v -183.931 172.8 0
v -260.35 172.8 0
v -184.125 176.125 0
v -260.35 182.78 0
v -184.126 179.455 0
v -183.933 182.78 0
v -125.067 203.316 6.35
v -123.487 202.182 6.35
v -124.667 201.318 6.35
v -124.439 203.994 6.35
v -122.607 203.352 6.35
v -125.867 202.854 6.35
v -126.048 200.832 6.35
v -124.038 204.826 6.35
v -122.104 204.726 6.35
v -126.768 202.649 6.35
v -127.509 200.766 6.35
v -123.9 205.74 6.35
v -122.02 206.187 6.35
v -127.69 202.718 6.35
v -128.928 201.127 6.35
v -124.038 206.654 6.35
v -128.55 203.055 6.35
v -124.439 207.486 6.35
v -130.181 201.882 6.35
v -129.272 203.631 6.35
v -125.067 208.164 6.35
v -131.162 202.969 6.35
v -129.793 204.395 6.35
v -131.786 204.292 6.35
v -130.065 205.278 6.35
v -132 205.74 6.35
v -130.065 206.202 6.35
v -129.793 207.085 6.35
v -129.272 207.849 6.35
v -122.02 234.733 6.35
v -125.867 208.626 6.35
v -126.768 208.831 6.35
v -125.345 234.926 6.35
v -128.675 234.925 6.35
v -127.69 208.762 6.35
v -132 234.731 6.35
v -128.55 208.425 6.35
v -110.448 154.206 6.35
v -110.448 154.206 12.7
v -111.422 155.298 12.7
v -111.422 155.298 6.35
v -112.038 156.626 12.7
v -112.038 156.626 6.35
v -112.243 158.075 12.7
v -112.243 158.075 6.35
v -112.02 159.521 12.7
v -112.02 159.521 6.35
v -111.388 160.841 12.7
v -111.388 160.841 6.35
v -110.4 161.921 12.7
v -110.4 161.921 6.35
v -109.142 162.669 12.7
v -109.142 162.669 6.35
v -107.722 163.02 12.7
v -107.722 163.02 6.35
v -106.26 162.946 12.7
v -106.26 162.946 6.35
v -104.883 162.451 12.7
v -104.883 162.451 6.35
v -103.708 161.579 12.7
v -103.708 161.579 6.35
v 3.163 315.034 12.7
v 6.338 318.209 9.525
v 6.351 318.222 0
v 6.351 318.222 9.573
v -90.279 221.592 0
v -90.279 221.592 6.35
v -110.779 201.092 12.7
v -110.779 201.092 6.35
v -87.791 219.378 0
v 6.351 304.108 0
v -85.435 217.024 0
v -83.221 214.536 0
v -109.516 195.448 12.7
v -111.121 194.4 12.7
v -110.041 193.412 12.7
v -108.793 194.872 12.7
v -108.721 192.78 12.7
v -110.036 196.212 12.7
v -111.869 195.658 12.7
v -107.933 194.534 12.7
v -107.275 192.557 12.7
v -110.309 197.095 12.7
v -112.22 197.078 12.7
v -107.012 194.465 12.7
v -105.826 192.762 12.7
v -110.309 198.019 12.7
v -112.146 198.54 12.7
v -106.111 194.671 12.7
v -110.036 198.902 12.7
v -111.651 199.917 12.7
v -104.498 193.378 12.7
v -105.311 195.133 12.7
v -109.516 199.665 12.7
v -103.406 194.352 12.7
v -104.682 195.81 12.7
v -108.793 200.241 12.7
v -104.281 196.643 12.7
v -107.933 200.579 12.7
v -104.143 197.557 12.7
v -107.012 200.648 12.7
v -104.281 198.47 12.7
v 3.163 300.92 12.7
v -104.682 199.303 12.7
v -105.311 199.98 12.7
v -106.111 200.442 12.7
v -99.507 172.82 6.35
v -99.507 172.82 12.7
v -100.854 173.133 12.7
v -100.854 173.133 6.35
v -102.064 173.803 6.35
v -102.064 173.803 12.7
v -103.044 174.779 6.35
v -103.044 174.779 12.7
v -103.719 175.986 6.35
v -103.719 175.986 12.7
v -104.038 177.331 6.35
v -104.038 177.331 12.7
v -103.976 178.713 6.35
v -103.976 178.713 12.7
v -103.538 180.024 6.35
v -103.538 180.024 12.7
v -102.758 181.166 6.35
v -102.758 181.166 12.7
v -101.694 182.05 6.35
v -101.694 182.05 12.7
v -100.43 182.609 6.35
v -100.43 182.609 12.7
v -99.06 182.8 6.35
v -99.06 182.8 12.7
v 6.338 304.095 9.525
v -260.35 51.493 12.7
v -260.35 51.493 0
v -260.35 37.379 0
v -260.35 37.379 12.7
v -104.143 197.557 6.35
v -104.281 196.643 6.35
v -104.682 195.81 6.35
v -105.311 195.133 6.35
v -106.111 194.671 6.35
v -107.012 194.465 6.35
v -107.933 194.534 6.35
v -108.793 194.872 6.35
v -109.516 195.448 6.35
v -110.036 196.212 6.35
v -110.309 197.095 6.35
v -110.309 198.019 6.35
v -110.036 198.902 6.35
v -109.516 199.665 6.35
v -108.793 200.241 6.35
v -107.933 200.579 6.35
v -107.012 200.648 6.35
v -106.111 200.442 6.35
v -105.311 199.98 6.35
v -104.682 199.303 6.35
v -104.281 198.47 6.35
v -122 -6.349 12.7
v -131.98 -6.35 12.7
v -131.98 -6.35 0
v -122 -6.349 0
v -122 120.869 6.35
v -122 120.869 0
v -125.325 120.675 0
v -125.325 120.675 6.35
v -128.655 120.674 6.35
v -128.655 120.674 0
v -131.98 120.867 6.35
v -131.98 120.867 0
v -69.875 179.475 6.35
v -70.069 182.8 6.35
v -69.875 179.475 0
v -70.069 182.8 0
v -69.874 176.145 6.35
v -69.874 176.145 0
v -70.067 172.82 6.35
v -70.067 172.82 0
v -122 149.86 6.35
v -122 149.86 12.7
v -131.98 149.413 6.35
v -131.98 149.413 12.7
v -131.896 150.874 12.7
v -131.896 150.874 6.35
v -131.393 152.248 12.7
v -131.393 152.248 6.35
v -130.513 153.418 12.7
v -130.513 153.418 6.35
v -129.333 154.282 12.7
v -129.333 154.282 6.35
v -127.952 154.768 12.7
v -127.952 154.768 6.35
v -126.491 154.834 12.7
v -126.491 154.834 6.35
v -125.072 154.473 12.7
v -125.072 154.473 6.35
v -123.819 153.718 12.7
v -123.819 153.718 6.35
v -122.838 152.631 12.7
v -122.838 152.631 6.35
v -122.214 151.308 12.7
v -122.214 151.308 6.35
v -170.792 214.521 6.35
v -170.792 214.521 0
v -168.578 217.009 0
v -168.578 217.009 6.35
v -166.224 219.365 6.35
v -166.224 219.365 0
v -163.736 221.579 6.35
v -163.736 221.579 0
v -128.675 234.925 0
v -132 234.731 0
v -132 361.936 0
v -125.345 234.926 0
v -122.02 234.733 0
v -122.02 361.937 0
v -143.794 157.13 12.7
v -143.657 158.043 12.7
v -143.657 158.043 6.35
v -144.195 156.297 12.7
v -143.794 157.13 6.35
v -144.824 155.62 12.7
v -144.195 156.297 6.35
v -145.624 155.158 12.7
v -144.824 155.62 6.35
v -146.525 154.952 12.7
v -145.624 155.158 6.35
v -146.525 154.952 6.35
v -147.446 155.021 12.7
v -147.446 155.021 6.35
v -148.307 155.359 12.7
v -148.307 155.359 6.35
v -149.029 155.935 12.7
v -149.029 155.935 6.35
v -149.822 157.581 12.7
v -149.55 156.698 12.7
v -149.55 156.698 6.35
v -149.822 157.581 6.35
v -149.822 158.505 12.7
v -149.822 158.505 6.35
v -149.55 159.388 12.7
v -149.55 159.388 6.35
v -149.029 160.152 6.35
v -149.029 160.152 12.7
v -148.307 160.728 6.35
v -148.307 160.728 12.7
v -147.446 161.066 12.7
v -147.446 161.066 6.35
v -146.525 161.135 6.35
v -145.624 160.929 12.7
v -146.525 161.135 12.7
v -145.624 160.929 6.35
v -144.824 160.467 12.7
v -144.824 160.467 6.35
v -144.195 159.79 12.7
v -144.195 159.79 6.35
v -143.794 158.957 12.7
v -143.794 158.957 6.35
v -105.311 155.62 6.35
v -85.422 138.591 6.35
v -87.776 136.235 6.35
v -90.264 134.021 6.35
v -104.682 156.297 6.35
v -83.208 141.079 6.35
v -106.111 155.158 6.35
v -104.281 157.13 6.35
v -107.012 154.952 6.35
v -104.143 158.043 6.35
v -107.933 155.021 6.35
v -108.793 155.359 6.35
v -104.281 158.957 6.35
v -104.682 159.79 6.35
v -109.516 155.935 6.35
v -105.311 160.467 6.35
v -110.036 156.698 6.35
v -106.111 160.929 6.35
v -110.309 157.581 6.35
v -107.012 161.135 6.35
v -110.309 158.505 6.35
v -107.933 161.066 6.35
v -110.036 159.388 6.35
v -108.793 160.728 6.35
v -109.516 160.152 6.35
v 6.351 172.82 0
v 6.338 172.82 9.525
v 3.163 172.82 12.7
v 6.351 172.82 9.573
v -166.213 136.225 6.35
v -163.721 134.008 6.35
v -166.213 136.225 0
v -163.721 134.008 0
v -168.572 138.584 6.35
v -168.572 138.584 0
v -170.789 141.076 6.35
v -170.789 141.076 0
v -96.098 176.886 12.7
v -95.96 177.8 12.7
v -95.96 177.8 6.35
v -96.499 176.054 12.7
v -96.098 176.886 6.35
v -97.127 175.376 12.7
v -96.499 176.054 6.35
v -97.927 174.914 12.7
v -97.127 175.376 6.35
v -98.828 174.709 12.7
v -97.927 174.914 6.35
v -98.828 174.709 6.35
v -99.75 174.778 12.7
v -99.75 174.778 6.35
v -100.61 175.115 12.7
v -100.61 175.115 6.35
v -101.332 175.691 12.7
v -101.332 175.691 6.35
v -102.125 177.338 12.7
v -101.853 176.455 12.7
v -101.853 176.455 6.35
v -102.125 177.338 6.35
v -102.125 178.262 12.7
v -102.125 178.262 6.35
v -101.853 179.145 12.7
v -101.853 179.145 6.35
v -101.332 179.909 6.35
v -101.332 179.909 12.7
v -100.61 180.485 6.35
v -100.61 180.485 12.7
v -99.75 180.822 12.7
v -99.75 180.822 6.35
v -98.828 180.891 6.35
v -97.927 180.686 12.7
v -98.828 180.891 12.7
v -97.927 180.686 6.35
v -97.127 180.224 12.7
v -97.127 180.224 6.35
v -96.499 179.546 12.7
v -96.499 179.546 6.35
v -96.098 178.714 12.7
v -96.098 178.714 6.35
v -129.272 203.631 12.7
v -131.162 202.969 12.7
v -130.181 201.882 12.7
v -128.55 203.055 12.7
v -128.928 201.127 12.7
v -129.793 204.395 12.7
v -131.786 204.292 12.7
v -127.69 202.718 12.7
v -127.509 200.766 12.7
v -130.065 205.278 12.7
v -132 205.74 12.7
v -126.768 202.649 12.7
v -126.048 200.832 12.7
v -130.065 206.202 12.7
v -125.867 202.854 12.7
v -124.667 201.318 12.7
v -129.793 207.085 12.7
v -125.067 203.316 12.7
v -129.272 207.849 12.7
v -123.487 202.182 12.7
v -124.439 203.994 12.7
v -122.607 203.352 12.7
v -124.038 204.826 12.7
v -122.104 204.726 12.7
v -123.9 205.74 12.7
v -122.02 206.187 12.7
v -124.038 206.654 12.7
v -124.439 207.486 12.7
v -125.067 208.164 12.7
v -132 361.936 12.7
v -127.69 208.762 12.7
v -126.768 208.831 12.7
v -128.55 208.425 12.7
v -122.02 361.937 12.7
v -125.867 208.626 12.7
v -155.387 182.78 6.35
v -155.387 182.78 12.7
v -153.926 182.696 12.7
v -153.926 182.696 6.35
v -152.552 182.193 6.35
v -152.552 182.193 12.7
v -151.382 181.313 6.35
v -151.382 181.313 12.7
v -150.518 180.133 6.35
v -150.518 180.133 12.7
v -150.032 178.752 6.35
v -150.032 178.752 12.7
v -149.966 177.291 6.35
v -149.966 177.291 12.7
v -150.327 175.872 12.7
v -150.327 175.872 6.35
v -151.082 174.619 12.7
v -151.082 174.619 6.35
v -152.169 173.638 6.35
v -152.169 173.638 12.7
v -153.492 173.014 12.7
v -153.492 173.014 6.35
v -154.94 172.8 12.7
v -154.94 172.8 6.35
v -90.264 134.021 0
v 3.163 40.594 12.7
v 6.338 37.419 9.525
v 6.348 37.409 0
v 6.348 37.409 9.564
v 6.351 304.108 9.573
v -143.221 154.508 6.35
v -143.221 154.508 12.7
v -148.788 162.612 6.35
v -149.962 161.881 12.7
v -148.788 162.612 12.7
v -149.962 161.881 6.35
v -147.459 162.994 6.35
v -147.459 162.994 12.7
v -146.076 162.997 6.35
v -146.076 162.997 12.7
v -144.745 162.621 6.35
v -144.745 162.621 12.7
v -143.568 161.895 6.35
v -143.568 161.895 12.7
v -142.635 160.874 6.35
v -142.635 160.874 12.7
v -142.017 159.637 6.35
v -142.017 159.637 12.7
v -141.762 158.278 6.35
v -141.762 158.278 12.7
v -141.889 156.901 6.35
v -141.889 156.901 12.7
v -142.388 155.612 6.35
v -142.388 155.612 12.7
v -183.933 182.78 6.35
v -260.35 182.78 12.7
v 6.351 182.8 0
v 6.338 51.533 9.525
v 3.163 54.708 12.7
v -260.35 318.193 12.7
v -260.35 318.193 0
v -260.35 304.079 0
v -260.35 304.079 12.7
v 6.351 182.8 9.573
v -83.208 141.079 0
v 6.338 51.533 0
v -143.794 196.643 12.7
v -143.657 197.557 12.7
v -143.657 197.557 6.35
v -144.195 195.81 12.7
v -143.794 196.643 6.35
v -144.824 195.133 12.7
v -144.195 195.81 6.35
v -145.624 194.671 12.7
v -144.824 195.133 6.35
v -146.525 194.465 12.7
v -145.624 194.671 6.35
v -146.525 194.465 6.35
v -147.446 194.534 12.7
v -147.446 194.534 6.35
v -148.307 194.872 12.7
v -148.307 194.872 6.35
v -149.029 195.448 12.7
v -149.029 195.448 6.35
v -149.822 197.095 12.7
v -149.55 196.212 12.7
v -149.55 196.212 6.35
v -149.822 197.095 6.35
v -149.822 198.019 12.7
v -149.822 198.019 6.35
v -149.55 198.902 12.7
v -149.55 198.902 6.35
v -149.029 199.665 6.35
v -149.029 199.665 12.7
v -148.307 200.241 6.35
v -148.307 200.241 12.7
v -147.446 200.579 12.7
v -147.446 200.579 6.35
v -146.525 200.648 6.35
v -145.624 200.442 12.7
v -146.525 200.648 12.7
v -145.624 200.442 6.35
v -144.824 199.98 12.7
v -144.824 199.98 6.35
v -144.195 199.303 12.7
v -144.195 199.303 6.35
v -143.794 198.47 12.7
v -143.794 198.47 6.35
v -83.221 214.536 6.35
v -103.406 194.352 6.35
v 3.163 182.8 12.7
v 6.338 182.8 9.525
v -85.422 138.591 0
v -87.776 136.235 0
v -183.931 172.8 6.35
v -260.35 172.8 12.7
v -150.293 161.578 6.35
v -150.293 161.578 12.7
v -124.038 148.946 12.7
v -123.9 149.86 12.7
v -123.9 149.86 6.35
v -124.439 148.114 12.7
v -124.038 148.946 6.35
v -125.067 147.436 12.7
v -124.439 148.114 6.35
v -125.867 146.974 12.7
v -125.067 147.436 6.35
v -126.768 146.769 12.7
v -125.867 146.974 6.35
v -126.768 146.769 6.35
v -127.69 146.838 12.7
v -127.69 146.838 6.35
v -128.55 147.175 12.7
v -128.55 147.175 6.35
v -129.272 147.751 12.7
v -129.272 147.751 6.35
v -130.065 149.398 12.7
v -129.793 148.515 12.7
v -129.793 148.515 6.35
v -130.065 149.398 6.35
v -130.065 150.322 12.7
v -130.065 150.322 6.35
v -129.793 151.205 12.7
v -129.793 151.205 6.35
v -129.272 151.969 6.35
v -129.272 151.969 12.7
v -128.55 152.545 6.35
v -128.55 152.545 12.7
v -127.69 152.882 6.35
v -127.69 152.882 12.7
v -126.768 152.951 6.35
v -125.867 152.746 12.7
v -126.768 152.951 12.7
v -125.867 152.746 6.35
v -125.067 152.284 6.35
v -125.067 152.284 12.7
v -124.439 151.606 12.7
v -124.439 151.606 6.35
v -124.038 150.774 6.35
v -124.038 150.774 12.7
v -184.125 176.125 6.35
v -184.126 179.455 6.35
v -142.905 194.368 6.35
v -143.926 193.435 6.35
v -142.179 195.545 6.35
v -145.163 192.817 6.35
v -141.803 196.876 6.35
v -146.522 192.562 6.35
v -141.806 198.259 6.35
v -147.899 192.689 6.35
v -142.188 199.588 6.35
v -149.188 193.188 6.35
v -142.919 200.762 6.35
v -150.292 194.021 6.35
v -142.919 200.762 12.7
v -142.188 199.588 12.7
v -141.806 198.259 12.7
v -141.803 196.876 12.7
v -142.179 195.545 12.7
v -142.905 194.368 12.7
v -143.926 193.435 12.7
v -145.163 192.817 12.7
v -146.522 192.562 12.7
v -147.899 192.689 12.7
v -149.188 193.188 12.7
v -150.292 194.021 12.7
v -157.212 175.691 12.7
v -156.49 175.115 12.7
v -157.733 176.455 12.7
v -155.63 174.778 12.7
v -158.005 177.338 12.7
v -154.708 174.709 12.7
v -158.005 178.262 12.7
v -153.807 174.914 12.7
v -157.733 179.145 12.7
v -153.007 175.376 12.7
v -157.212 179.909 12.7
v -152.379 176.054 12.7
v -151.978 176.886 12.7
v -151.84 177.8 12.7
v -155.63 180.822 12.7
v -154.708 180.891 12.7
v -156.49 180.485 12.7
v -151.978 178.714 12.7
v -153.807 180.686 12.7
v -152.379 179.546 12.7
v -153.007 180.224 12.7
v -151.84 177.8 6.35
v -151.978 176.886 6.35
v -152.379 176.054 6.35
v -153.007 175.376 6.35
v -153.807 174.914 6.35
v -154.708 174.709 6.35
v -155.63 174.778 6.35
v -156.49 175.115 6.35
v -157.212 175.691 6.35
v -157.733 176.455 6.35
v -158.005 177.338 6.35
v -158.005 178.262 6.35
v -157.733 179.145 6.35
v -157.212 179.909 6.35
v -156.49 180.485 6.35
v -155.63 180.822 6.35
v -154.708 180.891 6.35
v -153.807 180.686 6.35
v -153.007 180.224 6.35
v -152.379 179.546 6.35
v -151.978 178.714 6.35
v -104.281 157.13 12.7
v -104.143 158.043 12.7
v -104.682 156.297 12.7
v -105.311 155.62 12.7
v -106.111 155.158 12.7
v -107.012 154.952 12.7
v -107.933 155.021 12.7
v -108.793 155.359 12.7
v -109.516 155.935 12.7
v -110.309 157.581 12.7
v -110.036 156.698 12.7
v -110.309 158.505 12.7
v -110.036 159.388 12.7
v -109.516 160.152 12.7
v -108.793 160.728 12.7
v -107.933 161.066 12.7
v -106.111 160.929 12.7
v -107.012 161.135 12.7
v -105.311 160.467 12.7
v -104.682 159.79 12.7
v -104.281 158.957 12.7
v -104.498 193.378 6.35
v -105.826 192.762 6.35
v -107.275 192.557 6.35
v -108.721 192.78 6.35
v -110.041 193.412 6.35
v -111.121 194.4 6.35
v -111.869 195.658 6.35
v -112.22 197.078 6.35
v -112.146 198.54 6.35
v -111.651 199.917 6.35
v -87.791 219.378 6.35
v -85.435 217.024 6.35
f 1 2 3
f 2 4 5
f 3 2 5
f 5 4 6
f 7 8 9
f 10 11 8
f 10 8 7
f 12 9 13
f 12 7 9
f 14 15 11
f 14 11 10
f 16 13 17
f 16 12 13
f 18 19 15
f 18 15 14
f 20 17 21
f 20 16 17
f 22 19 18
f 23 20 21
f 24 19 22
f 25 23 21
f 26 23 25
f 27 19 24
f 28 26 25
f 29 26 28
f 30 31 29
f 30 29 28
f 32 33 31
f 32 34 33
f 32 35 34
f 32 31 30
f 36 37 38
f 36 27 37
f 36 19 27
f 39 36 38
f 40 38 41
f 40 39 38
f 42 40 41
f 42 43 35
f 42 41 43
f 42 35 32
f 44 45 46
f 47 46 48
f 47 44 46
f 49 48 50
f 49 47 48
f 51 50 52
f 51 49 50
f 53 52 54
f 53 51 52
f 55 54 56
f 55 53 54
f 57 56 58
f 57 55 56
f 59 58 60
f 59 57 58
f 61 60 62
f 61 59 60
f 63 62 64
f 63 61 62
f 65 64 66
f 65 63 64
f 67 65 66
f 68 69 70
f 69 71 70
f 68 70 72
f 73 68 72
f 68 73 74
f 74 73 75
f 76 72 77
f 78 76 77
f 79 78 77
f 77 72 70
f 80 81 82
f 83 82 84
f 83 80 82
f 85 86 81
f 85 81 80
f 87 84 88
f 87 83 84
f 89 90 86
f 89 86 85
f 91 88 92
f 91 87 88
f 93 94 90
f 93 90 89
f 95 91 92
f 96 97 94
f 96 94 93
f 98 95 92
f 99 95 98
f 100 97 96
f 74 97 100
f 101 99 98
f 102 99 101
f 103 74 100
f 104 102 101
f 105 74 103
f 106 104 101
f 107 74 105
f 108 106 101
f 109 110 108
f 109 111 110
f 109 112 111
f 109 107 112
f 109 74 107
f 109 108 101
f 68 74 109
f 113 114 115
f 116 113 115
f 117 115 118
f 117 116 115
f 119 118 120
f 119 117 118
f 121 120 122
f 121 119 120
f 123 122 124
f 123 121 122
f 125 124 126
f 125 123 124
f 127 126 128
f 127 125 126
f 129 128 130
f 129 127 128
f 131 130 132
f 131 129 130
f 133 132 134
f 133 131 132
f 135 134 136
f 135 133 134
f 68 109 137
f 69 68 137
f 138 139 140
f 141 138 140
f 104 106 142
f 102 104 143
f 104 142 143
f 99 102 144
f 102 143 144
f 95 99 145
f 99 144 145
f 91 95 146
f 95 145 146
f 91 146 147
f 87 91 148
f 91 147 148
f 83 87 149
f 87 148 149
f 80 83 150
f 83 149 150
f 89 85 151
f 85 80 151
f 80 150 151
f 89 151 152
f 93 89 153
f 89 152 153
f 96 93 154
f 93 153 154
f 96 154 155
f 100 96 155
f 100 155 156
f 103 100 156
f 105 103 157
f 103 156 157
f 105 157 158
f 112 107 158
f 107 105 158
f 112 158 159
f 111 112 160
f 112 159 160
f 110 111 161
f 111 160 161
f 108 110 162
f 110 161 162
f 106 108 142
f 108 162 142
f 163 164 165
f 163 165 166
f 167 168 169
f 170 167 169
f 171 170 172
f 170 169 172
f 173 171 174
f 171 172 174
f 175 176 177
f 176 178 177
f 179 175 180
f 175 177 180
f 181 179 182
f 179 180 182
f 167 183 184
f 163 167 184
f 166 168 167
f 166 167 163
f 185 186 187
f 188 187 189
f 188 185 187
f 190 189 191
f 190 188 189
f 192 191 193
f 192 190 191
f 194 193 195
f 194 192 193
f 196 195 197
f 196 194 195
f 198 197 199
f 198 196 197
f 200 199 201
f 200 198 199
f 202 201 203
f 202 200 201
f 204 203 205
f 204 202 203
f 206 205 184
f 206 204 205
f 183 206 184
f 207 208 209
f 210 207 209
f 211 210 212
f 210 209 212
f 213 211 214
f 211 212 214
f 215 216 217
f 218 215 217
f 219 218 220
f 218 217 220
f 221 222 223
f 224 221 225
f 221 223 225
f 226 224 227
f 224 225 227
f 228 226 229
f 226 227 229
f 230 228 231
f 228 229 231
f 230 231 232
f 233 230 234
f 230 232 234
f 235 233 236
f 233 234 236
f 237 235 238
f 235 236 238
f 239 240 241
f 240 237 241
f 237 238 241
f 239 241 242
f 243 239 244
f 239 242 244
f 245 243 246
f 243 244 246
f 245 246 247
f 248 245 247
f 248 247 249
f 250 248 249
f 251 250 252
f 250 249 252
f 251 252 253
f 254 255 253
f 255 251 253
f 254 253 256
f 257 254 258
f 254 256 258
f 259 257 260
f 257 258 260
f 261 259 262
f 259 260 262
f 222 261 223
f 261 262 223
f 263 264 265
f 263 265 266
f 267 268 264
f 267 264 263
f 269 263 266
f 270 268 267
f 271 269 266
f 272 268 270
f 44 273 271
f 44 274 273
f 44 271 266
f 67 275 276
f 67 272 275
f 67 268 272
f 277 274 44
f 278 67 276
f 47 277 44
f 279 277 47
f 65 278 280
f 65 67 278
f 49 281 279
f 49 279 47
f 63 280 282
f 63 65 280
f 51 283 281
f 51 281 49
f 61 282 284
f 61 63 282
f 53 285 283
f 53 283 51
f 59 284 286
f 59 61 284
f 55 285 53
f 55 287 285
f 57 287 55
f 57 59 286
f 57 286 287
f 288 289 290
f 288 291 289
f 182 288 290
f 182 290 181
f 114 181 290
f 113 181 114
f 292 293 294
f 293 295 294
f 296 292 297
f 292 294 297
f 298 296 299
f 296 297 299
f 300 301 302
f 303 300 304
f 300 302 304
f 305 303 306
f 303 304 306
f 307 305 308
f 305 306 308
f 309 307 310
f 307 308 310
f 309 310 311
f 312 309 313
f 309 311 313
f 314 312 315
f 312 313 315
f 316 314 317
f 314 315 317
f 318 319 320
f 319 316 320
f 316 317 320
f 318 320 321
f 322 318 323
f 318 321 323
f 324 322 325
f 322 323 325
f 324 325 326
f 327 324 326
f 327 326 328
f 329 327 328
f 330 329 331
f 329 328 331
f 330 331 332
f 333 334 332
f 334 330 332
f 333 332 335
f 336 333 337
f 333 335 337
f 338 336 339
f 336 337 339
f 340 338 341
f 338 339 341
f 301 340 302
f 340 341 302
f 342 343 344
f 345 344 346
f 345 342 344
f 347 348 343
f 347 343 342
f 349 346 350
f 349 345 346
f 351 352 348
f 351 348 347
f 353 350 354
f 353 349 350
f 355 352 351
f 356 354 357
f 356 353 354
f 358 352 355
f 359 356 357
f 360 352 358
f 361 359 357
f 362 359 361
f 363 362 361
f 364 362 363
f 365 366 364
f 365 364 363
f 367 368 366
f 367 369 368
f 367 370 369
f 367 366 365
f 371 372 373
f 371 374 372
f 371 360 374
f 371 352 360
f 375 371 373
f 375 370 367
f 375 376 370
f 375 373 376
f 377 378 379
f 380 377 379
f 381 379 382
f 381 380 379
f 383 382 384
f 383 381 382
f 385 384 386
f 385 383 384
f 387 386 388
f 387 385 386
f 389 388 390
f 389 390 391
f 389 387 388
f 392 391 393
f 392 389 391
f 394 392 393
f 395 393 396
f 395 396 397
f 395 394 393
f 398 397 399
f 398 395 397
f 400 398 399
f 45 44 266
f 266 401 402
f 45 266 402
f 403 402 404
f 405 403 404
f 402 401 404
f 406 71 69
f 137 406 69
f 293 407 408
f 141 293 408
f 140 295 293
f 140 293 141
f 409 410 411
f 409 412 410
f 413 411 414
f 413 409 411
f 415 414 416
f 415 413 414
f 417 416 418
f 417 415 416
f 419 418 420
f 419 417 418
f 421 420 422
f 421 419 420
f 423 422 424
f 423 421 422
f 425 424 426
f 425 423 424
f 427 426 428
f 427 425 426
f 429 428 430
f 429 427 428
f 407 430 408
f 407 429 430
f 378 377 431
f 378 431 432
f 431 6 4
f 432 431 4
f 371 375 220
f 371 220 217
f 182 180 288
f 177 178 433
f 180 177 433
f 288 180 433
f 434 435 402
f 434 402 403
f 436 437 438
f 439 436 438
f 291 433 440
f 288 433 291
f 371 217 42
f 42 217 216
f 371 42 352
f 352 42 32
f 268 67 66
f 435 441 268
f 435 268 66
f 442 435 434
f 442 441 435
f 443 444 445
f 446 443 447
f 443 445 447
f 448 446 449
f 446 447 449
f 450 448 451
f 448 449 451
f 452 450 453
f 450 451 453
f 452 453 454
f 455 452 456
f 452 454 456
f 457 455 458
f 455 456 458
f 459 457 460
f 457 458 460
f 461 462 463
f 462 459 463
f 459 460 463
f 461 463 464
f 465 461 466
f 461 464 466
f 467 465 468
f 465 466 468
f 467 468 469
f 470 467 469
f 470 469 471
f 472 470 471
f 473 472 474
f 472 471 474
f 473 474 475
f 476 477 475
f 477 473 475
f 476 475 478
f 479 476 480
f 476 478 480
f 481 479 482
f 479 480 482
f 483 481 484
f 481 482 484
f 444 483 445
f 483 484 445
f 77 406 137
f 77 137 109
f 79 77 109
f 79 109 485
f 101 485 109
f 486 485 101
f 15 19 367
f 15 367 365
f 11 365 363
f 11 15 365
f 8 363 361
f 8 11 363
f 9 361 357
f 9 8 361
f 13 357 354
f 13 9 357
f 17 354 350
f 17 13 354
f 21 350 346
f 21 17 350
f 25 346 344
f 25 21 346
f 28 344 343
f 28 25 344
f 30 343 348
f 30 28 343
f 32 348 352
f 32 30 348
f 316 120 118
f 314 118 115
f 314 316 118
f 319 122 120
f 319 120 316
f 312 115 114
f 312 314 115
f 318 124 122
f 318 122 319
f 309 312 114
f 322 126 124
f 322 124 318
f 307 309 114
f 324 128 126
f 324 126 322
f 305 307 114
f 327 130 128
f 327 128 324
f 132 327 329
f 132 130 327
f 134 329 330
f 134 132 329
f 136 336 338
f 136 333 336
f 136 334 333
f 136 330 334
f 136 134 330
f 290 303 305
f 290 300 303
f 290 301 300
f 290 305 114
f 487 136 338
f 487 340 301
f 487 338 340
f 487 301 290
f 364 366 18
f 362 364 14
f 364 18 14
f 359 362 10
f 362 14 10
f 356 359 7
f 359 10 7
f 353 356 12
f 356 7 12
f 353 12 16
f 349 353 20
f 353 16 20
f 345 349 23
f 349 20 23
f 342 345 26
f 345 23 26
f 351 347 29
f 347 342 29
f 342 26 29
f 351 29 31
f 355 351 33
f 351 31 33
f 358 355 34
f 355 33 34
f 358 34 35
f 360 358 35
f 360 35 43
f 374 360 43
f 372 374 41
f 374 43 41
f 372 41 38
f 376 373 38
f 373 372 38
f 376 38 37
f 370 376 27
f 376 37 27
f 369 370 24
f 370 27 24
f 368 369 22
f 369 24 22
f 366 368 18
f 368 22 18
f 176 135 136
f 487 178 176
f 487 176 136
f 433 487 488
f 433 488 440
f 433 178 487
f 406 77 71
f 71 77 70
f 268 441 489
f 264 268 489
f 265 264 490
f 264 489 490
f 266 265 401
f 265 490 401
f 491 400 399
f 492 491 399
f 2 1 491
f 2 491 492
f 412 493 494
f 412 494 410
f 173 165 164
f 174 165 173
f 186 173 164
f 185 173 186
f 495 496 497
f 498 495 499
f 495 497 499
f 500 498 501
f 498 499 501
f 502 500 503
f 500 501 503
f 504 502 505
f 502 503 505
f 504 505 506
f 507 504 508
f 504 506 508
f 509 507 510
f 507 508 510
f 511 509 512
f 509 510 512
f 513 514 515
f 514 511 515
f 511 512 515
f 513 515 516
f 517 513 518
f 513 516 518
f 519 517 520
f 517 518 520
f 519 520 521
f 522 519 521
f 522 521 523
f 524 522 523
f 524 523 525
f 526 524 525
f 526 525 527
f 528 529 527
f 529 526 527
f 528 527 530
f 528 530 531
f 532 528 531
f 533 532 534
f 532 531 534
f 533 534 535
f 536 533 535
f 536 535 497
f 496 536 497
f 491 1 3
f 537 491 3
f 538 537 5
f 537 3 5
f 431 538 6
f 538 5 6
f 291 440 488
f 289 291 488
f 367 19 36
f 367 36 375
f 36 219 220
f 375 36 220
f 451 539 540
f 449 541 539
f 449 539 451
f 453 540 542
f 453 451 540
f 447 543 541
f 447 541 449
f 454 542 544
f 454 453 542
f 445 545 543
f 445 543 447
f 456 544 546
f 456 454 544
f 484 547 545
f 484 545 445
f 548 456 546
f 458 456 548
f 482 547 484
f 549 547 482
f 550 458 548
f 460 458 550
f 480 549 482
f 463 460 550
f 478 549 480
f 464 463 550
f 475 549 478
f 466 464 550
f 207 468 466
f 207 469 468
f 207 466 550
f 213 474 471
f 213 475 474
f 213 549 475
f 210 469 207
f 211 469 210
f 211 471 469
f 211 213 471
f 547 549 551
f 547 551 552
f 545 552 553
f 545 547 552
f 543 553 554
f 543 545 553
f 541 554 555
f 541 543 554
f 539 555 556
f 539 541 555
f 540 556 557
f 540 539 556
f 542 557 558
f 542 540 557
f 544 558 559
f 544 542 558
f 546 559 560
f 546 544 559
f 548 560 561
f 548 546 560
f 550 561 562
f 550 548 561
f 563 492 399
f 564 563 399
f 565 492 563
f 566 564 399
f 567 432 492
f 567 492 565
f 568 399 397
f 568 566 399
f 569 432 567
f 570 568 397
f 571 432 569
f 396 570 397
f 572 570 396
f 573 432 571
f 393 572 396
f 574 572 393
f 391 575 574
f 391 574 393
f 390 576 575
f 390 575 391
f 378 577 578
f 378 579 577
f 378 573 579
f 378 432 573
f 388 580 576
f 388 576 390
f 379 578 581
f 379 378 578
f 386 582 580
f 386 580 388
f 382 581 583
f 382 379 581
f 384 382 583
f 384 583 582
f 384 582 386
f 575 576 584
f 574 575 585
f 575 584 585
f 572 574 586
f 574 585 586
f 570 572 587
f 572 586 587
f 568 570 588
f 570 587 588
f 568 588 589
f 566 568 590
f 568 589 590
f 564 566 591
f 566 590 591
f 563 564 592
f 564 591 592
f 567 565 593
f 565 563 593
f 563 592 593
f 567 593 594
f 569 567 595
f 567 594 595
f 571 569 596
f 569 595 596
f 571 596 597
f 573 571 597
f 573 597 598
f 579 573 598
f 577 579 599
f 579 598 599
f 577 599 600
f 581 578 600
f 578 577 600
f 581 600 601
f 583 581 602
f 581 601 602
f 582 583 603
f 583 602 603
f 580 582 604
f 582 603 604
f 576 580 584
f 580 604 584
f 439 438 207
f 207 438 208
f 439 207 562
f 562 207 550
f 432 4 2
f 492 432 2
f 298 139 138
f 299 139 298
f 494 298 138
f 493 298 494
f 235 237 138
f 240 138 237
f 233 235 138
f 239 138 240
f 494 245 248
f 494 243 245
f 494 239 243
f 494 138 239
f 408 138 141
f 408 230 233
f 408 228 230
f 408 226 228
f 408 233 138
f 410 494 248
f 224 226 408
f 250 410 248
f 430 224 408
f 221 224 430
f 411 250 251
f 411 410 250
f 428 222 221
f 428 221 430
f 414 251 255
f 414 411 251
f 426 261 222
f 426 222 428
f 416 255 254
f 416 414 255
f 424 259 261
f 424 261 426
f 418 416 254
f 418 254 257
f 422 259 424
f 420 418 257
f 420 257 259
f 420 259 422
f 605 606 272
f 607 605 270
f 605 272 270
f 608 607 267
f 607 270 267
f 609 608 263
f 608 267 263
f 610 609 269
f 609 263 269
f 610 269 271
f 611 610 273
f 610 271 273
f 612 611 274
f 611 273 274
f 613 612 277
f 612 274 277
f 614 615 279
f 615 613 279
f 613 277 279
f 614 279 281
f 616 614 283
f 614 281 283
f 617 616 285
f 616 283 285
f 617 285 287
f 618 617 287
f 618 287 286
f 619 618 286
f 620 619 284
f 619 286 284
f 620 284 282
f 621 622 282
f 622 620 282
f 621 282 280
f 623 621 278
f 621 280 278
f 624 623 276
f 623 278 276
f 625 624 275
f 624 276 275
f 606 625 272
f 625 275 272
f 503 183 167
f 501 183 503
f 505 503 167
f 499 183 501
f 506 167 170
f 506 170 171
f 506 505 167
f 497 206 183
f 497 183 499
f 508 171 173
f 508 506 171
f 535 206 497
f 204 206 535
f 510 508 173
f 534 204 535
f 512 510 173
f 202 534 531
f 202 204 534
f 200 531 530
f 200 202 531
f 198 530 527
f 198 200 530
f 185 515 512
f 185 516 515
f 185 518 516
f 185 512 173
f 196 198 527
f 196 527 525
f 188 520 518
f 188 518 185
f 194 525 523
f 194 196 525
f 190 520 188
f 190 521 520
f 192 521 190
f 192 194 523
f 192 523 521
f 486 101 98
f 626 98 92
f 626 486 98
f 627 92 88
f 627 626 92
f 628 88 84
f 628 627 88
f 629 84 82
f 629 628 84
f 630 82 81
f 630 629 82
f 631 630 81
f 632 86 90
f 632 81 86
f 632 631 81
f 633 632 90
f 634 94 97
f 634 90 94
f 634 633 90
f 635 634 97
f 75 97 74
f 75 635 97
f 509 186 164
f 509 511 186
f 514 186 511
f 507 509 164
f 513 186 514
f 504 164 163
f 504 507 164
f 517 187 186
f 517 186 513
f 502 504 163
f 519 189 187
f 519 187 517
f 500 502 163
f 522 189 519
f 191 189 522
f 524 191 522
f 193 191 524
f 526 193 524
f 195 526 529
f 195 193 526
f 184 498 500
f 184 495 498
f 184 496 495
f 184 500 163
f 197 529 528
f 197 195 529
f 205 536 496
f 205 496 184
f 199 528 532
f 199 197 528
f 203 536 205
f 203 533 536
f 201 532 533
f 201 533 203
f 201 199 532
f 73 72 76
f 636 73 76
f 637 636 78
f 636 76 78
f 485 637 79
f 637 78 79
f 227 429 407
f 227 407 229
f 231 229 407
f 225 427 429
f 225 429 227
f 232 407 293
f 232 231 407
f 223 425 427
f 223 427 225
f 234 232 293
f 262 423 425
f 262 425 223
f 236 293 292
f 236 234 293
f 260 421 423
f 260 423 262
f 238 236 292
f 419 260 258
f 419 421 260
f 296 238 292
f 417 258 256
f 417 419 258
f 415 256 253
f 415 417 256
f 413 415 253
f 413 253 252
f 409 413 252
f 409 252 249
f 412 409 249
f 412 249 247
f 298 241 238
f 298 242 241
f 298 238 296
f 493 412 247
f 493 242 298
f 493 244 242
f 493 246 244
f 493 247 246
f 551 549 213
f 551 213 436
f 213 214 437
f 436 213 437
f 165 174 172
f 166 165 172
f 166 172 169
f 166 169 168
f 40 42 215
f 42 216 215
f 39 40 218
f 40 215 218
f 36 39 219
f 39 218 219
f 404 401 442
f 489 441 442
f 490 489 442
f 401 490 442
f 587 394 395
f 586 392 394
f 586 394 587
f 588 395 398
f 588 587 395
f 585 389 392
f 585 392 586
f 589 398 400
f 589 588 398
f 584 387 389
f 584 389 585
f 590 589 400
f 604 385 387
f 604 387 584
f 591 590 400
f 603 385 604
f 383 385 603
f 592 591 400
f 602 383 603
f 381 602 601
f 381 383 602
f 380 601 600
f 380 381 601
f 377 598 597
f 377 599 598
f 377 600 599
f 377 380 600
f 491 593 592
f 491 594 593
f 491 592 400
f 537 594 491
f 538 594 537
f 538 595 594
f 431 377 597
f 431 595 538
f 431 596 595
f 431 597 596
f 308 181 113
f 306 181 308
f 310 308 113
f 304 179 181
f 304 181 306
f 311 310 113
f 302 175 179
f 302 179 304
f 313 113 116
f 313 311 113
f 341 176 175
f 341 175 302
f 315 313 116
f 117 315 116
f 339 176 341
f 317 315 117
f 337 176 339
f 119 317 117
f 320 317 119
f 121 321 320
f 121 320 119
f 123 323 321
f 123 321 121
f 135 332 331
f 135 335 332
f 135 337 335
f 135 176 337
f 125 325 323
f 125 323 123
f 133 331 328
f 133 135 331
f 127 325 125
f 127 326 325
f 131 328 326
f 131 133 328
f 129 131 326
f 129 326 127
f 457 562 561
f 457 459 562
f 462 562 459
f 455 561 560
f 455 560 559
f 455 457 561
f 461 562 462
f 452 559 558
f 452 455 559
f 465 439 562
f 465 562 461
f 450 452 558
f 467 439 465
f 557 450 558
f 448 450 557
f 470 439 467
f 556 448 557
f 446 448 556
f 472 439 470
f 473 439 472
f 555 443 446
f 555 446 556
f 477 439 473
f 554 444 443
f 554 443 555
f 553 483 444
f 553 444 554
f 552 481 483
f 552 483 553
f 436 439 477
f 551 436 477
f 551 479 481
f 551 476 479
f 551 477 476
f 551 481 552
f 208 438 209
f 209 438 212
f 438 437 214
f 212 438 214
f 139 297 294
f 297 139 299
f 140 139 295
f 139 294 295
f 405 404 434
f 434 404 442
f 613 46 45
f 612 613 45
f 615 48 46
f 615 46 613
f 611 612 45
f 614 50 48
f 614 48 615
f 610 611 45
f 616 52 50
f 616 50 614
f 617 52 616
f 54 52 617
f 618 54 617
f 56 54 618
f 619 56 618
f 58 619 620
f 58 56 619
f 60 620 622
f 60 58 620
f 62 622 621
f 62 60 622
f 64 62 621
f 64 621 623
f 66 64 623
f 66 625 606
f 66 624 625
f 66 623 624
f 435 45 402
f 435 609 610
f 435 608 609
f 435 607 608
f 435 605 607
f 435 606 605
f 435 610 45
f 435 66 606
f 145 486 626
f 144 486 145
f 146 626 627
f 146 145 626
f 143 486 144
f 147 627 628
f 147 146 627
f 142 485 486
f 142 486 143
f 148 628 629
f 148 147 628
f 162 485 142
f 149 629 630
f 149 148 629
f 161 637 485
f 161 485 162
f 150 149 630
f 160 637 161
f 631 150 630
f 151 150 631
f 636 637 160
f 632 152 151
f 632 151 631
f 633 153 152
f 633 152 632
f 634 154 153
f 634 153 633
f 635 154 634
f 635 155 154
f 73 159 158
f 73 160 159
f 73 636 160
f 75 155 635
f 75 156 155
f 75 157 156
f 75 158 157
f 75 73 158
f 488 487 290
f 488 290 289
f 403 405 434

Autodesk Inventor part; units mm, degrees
ref_plane "YZ Plane" through (0, 0, 0) normal (1, 0, 0) x (0, 1, 0)
ref_plane "XZ Plane" through (0, 0, 0) normal (0, 1, 0) x (-1, 0, 0)
ref_plane "XY Plane" through (0, 0, 0) normal (0, 0, 1) x (1, 0, 0)
sketch "Sketch1" plane through (0, 0, 0) normal (0, 0, 1) x (1, 0, 0)
  line L0 (0, 0) -> (0, 355.6) construction
  line L1 (-254, 0) -> (0, 0) construction
  line L2 (0, 355.6) -> (-254, 0) construction
  circle A0 centre (-127, 177.8) radius 38.1 construction
  circle A1 centre (-127, 177.8) radius 27.94 construction
  line L3 (0, 355.6) -> (0, 325.12) construction
  line L4 (-127, 177.8) -> (-100.0592, 204.7408) construction
  line L5 (-127, 177.8) -> (-95.96, 177.8) construction
  circle A2 centre (-107.2434, 197.5566) radius 3.1 construction
  circle A3 centre (-127, 205.74) radius 3.1 construction
  circle A4 centre (-127, 177.8) radius 27.94 construction
  circle A5 centre (-146.7566, 197.5566) radius 3.1 construction
  circle A6 centre (-127, 177.8) radius 27.94 construction
  circle A7 centre (-154.94, 177.8) radius 3.1 construction
  circle A8 centre (-127, 177.8) radius 27.94 construction
  circle A9 centre (-146.7566, 158.0434) radius 3.1 construction
  circle A10 centre (-127, 177.8) radius 27.94 construction
  circle A11 centre (-127, 149.86) radius 3.1 construction
  circle A12 centre (-127, 177.8) radius 27.94 construction
  circle A13 centre (-107.2434, 158.0434) radius 3.1 construction
  circle A14 centre (-127, 177.8) radius 27.94 construction
  circle A15 centre (-99.06, 177.8) radius 3.1 construction
  circle A16 centre (-127, 177.8) radius 27.94 construction
  arc A17 (-99.06, 182.8) -> (-98.6126, 172.8201) centre (-99.06, 177.8) ccw construction
  line L6 (-99.06, 182.8) -> (104.14, 182.8) construction
  line L7 (104.14, 182.8) -> (104.773, 172.8201) construction
  line L8 (104.773, 172.8201) -> (-99.5074, 172.8201) construction
  line L9 (-110.779, 201.0921) -> (32.9051, 344.7762) construction
  line L10 (32.9051, 344.7762) -> (40.4096, 338.1669) construction
  line L11 (40.4096, 338.1669) -> (-104.0384, 193.7189) construction
  arc A18 (-110.779, 201.0921) -> (-103.4057, 194.3516) centre (-107.2434, 197.5566) ccw construction
  line L12 (-132, 205.74) -> (-132, 408.94) construction
  line L13 (-132, 408.94) -> (-122.0201, 409.573) construction
  line L14 (-122.0201, 409.573) -> (-122.0201, 205.2926) construction
  arc A19 (-132, 205.74) -> (-122.0201, 206.1874) centre (-127, 205.74) ccw construction
  line L15 (-150.2921, 194.021) -> (-293.9762, 337.7051) construction
  line L16 (-293.9762, 337.7051) -> (-287.3669, 345.2096) construction
  line L17 (-287.3669, 345.2096) -> (-142.9189, 200.7616) construction
  arc A20 (-150.2921, 194.021) -> (-143.5516, 201.3943) centre (-146.7566, 197.5566) ccw construction
  line L18 (-154.94, 172.8) -> (-358.14, 172.8) construction
  line L19 (-358.14, 172.8) -> (-358.773, 182.7799) construction
  line L20 (-358.773, 182.7799) -> (-154.4926, 182.7799) construction
  arc A21 (-154.94, 172.8) -> (-155.3874, 182.7799) centre (-154.94, 177.8) ccw construction
  line L21 (-143.221, 154.5079) -> (-286.9051, 10.8238) construction
  line L22 (-286.9051, 10.8238) -> (-294.4096, 17.4331) construction
  line L23 (-294.4096, 17.4331) -> (-149.9616, 161.8811) construction
  arc A22 (-143.221, 154.5079) -> (-150.5943, 161.2484) centre (-146.7566, 158.0434) ccw construction
  line L24 (-122, 149.86) -> (-122, -53.34) construction
  line L25 (-122, -53.34) -> (-131.9799, -53.973) construction
  line L26 (-131.9799, -53.973) -> (-131.9799, 150.3074) construction
  arc A23 (-122, 149.86) -> (-131.9799, 149.4126) centre (-127, 149.86) ccw construction
  line L27 (-103.7079, 161.579) -> (39.9762, 17.8949) construction
  line L28 (39.9762, 17.8949) -> (33.3669, 10.3904) construction
  line L29 (33.3669, 10.3904) -> (-111.0811, 154.8384) construction
  arc A24 (-103.7079, 161.579) -> (-110.4484, 154.2057) centre (-107.2434, 158.0434) ccw construction
  line L30 (0, 355.6) -> (-254, 355.6) construction
  line L31 (-254, 0) -> (-254, 355.6) construction
  line L32 (-254, 355.6) -> (0, 355.6) construction
  line L33 (0, 355.6) -> (0, 0) construction
  line L34 (-254, 0) -> (0, 0) construction
  line L35 (-131.9799, -6.3504) -> (-122, -6.3494)
  line L36 (-122.0201, 361.9374) -> (-132, 361.9364)
  line L37 (-99.06, 182.8) -> (6.351, 182.8)
  line L38 (6.351, 182.8) -> (6.351, 172.8201)
  line L39 (6.351, 172.8201) -> (-99.5074, 172.8201)
  line L40 (-103.7079, 161.579) -> (6.3381, 51.533)
  line L41 (-110.4484, 154.2057) -> (6.3485, 37.4088)
  line L42 (-122, 149.86) -> (-122, -6.3494)
  line L43 (-131.9799, -6.3504) -> (-131.9799, 149.4126)
  arc A25 (-122, 149.86) -> (-131.9799, 149.4126) centre (-127, 149.86) ccw
  arc A26 (-103.7079, 161.579) -> (-110.4484, 154.2057) centre (-107.2434, 158.0434) ccw
  arc A27 (-99.06, 182.8) -> (-99.5074, 172.8201) centre (-99.06, 177.8) ccw
  circle A28 centre (-127, 149.86) radius 3.1
  circle A29 centre (-107.2434, 158.0434) radius 3.1
  circle A30 centre (-99.06, 177.8) radius 3.1
  circle A31 centre (-107.2434, 197.5566) radius 3.1
  arc A32 (-110.779, 201.0921) -> (-103.4057, 194.3516) centre (-107.2434, 197.5566) ccw
  circle A33 centre (-127, 205.74) radius 3.1
  arc A34 (-132, 205.74) -> (-122.0201, 206.1874) centre (-127, 205.74) ccw
  circle A35 centre (-146.7566, 197.5566) radius 3.1
  arc A36 (-150.2921, 194.021) -> (-142.9189, 200.7616) centre (-146.7566, 197.5566) ccw
  circle A37 centre (-154.94, 177.8) radius 3.1
  arc A38 (-154.94, 172.8) -> (-155.3874, 182.7799) centre (-154.94, 177.8) ccw
  circle A39 centre (-146.7566, 158.0434) radius 3.1
  arc A40 (-143.221, 154.5079) -> (-149.9616, 161.8811) centre (-146.7566, 158.0434) ccw
  line L44 (-154.94, 172.8) -> (-260.35, 172.8)
  line L45 (-154.4926, 182.7799) -> (-260.35, 182.7799)
  line L46 (6.3485, 37.4088) -> (6.3381, 51.533)
  line L47 (-143.221, 154.5079) -> (-260.35, 37.3789)
  line L48 (-260.35, 51.4927) -> (-150.293, 161.5781)
  line L49 (-150.293, 161.5781) -> (-149.9616, 161.8811)
  line L50 (-260.35, 51.4927) -> (-260.35, 37.3789)
  line L51 (-142.9189, 200.7616) -> (-260.35, 318.1927)
  line L52 (-260.35, 304.0789) -> (-150.2921, 194.021)
  line L53 (-132, 361.9364) -> (-132, 205.74)
  line L54 (-122.0201, 206.1874) -> (-122.0201, 361.9374)
  line L55 (6.351, 304.1083) -> (-103.4057, 194.3516)
  line L56 (6.351, 318.2221) -> (-110.779, 201.0921)
  line L57 (-260.35, 318.1927) -> (-260.35, 304.0789)
  line L58 (-260.35, 182.7799) -> (-260.35, 172.8)
  line L59 (6.351, 172.8201) -> (6.351, 182.8)
  line L60 (6.351, 304.1083) -> (6.351, 318.2221)
  dimension "d4" = 76.2
  dimension "d5" = 55.88
  dimension "d6" = 30.48
  dimension "d7" = 45
  dimension "d8" = 6.2
  dimension "d9" = 360
  dimension "d10" = 10
  dimension "d11" = 203.2
  dimension "d12" = 10
  dimension "d13" = 360
extrude "Extrusion1" add sketch "Sketch1" along normal blind 12.7
sketch "Sketch2" plane through (0, 0, 0) normal (0, 0, -1) x (-1, 0, 0)
  circle A0 centre (146.7566, 197.5566) radius 3.1 construction
  circle A1 centre (107.2434, 158.0434) radius 3.1 construction
  line L0 (146.7566, 197.5566) -> (107.2434, 158.0434) construction
  circle A2 centre (127, 177.8) radius 57.15
  point P0 (0, 0)
  dimension "d17" = 114.3
extrude "Extrusion2" cut sketch "Sketch2" against normal blind 6.35
sketch "Sketch3" plane through (-99.5074, 172.8201, 12.7) normal (0, -1, 0) x (1, 0, 0)
  line L0 (102.6704, 0) -> (105.8454, -3.175)
  line L1 (106.7063, 0) -> (102.6704, 0)
  line L2 (106.7063, 0) -> (105.8454, -3.175)
  point P0 (99.5074, -12.7)
  point P1 (105.8454, 0)
extrude "Extrusion3" cut sketch "Sketch3" along normal mid plane 508
properties part number "pins"
